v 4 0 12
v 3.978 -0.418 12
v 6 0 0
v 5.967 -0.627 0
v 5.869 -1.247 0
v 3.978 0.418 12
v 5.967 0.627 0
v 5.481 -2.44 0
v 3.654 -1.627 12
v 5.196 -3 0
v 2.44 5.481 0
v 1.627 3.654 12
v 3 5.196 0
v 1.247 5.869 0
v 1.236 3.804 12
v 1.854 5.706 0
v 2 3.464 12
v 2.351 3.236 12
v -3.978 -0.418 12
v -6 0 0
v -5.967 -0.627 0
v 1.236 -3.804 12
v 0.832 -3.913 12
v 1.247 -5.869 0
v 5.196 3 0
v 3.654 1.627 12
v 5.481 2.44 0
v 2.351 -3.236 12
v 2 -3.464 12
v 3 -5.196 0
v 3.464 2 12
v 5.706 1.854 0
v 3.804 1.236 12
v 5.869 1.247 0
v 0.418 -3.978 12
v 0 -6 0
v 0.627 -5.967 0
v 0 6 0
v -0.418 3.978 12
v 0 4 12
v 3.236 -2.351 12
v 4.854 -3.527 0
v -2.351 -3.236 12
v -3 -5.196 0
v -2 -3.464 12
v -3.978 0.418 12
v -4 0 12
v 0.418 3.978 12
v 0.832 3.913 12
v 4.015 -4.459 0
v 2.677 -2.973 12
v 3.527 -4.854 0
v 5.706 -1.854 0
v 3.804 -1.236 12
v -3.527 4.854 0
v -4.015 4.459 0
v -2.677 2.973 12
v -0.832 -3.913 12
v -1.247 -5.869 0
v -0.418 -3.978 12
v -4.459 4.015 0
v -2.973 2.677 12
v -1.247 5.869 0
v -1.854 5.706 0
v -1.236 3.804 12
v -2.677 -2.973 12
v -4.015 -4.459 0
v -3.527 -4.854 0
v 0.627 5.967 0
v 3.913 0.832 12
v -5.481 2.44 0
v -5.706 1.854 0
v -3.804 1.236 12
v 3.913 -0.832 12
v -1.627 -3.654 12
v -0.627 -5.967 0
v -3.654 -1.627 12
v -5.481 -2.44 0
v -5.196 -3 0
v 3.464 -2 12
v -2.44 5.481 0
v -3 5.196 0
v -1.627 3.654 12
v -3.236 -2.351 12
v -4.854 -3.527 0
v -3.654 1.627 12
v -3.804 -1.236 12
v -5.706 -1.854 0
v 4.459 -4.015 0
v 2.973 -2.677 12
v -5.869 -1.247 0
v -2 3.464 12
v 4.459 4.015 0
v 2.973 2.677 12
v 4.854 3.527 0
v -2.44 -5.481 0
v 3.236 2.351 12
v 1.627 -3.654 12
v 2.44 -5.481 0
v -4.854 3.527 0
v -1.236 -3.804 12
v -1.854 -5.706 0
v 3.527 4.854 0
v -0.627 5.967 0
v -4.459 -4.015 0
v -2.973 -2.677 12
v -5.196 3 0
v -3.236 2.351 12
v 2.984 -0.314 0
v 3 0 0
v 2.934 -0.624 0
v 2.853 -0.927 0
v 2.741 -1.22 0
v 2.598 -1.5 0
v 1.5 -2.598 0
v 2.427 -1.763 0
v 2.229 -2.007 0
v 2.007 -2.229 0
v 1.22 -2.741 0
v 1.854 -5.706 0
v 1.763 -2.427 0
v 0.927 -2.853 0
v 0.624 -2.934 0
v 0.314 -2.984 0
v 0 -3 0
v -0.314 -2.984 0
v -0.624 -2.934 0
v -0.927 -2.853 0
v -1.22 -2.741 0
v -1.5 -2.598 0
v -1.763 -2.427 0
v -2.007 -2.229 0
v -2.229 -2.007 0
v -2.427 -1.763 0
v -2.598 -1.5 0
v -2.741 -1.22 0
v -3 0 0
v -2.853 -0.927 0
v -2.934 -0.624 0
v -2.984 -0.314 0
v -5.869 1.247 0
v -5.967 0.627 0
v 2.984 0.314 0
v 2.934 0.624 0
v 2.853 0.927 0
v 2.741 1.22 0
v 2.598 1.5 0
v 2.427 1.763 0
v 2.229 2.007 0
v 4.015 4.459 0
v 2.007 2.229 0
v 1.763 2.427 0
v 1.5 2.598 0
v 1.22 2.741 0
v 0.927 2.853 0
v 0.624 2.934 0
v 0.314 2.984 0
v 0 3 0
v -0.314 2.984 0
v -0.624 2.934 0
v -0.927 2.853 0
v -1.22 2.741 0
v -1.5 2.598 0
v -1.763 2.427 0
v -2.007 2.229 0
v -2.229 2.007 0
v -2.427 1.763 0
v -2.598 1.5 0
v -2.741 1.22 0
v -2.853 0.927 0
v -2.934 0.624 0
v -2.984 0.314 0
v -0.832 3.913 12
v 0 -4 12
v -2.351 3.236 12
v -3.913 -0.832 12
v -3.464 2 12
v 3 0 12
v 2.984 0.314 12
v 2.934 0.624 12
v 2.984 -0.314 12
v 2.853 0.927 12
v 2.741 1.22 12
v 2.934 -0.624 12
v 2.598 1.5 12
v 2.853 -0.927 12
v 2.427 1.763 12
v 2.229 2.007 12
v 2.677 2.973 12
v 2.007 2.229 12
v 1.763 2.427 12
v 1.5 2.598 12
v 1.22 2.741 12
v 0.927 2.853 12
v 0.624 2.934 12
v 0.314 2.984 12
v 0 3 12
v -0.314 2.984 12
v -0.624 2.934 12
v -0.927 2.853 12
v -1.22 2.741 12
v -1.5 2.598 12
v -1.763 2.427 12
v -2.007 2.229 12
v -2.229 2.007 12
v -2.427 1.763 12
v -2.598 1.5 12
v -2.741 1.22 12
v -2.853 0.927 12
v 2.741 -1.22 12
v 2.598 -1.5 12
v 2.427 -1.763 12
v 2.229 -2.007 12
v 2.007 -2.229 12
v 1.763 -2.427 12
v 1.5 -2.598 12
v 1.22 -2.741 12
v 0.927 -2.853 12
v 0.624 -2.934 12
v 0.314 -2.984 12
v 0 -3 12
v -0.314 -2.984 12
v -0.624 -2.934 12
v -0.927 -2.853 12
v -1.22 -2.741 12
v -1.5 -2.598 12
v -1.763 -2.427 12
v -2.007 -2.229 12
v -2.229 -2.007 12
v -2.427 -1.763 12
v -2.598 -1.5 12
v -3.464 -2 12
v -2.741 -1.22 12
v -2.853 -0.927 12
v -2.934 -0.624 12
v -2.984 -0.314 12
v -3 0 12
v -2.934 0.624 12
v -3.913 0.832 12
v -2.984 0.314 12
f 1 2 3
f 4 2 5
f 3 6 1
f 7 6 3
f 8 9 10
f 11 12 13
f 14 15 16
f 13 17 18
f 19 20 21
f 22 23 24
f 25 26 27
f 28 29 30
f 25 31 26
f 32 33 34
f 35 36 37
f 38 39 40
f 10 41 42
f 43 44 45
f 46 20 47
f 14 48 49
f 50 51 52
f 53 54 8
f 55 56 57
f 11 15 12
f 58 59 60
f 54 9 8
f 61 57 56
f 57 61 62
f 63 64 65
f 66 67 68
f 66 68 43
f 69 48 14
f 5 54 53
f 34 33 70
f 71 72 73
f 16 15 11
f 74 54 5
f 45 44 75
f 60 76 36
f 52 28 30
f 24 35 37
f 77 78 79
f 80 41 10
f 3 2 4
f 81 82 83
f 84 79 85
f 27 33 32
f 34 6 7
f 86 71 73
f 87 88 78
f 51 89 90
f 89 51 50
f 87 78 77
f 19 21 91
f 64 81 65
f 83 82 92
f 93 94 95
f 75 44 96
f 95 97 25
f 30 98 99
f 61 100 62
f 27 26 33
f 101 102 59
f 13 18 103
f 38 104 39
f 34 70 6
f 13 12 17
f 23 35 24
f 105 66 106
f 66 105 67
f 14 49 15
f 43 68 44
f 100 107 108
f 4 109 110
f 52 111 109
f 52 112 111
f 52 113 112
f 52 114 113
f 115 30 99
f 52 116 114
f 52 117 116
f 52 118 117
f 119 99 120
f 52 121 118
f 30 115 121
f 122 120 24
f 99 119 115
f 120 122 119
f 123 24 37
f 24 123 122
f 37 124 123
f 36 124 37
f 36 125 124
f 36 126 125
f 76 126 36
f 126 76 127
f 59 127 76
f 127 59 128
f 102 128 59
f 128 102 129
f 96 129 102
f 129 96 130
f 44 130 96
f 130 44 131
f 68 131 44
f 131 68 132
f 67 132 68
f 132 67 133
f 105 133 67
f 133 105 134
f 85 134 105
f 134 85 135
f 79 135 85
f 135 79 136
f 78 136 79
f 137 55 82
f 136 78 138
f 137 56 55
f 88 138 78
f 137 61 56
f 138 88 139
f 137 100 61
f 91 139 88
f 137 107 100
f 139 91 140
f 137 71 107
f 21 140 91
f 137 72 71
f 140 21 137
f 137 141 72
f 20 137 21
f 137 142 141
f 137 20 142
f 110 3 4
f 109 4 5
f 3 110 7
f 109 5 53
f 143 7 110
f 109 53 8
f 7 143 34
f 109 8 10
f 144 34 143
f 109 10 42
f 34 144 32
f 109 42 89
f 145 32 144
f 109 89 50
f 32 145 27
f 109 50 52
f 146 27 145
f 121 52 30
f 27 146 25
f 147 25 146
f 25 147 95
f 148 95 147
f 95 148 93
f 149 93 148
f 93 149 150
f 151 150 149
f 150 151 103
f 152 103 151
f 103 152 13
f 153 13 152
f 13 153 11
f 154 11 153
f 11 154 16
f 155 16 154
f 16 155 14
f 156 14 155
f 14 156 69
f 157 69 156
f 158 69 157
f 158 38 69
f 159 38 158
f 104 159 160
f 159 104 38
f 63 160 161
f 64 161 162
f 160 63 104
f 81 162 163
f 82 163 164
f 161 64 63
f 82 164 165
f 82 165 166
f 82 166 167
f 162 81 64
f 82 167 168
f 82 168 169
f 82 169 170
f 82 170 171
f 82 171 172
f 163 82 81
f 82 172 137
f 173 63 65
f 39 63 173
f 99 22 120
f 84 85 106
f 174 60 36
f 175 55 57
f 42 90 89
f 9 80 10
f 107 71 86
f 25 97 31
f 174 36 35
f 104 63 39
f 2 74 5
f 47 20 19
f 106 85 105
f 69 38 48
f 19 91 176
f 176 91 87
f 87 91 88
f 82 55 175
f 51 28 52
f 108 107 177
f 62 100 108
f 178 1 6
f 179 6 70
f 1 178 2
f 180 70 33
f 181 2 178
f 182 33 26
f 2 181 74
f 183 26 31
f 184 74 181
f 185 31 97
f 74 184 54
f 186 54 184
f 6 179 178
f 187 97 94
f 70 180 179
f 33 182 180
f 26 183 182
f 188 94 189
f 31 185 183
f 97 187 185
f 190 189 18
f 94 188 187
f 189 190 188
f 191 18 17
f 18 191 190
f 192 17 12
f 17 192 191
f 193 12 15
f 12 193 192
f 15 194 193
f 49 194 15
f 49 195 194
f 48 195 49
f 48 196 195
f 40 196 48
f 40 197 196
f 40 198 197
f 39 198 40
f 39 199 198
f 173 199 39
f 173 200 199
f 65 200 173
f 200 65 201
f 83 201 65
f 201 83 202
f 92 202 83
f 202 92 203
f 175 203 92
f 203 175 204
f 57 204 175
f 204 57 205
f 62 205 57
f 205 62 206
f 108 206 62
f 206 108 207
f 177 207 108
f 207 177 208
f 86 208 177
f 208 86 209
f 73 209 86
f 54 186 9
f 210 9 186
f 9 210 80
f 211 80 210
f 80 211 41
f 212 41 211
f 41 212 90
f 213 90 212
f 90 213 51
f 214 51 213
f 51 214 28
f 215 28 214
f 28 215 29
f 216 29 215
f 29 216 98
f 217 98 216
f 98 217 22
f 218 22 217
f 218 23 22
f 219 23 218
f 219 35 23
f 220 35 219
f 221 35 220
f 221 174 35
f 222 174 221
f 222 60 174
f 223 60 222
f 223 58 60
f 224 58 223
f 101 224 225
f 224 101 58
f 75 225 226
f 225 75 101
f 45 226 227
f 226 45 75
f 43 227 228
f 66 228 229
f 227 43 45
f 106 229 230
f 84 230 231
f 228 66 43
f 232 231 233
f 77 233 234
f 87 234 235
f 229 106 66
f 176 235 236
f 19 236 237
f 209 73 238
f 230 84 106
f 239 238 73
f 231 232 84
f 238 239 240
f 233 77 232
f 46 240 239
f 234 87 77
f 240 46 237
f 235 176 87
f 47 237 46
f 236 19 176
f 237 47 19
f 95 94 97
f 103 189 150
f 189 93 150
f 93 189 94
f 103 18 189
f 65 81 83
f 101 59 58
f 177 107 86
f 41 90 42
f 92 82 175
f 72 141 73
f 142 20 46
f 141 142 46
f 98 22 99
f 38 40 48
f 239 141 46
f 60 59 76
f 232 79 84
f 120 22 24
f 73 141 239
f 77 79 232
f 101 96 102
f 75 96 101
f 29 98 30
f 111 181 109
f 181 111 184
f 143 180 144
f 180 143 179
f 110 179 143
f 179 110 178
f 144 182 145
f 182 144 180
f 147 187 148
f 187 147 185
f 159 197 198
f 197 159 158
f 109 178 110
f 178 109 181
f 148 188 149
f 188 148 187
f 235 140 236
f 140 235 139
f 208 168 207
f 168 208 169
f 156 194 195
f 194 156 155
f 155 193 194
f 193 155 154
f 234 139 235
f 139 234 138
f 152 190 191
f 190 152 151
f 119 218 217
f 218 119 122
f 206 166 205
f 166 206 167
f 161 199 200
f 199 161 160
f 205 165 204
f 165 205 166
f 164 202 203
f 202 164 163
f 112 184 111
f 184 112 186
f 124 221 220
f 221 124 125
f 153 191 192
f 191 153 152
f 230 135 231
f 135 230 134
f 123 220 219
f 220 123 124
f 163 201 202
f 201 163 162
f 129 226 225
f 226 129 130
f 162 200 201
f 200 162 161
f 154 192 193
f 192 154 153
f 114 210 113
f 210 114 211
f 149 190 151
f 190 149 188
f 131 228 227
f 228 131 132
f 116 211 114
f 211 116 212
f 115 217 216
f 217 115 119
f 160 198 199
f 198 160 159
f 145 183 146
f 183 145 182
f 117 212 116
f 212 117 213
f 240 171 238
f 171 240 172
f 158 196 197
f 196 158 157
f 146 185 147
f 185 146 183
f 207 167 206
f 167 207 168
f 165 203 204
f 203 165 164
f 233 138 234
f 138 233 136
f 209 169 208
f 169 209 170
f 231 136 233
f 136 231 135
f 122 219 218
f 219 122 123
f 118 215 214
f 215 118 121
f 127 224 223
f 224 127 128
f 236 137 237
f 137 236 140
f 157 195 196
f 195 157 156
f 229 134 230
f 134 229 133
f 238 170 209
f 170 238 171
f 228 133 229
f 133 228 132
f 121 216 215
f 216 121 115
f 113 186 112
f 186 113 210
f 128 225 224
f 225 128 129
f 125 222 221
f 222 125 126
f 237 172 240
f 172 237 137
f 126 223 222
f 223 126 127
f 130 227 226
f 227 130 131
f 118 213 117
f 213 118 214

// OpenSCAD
difference(){
  translate([0, 0, 6]) cylinder(d1=12, d2=8, h=12, center=true, $fn=60);
  translate([0, 0, 5.99]) cylinder(d=6, h=12.1, center=true, $fn=60);
}
